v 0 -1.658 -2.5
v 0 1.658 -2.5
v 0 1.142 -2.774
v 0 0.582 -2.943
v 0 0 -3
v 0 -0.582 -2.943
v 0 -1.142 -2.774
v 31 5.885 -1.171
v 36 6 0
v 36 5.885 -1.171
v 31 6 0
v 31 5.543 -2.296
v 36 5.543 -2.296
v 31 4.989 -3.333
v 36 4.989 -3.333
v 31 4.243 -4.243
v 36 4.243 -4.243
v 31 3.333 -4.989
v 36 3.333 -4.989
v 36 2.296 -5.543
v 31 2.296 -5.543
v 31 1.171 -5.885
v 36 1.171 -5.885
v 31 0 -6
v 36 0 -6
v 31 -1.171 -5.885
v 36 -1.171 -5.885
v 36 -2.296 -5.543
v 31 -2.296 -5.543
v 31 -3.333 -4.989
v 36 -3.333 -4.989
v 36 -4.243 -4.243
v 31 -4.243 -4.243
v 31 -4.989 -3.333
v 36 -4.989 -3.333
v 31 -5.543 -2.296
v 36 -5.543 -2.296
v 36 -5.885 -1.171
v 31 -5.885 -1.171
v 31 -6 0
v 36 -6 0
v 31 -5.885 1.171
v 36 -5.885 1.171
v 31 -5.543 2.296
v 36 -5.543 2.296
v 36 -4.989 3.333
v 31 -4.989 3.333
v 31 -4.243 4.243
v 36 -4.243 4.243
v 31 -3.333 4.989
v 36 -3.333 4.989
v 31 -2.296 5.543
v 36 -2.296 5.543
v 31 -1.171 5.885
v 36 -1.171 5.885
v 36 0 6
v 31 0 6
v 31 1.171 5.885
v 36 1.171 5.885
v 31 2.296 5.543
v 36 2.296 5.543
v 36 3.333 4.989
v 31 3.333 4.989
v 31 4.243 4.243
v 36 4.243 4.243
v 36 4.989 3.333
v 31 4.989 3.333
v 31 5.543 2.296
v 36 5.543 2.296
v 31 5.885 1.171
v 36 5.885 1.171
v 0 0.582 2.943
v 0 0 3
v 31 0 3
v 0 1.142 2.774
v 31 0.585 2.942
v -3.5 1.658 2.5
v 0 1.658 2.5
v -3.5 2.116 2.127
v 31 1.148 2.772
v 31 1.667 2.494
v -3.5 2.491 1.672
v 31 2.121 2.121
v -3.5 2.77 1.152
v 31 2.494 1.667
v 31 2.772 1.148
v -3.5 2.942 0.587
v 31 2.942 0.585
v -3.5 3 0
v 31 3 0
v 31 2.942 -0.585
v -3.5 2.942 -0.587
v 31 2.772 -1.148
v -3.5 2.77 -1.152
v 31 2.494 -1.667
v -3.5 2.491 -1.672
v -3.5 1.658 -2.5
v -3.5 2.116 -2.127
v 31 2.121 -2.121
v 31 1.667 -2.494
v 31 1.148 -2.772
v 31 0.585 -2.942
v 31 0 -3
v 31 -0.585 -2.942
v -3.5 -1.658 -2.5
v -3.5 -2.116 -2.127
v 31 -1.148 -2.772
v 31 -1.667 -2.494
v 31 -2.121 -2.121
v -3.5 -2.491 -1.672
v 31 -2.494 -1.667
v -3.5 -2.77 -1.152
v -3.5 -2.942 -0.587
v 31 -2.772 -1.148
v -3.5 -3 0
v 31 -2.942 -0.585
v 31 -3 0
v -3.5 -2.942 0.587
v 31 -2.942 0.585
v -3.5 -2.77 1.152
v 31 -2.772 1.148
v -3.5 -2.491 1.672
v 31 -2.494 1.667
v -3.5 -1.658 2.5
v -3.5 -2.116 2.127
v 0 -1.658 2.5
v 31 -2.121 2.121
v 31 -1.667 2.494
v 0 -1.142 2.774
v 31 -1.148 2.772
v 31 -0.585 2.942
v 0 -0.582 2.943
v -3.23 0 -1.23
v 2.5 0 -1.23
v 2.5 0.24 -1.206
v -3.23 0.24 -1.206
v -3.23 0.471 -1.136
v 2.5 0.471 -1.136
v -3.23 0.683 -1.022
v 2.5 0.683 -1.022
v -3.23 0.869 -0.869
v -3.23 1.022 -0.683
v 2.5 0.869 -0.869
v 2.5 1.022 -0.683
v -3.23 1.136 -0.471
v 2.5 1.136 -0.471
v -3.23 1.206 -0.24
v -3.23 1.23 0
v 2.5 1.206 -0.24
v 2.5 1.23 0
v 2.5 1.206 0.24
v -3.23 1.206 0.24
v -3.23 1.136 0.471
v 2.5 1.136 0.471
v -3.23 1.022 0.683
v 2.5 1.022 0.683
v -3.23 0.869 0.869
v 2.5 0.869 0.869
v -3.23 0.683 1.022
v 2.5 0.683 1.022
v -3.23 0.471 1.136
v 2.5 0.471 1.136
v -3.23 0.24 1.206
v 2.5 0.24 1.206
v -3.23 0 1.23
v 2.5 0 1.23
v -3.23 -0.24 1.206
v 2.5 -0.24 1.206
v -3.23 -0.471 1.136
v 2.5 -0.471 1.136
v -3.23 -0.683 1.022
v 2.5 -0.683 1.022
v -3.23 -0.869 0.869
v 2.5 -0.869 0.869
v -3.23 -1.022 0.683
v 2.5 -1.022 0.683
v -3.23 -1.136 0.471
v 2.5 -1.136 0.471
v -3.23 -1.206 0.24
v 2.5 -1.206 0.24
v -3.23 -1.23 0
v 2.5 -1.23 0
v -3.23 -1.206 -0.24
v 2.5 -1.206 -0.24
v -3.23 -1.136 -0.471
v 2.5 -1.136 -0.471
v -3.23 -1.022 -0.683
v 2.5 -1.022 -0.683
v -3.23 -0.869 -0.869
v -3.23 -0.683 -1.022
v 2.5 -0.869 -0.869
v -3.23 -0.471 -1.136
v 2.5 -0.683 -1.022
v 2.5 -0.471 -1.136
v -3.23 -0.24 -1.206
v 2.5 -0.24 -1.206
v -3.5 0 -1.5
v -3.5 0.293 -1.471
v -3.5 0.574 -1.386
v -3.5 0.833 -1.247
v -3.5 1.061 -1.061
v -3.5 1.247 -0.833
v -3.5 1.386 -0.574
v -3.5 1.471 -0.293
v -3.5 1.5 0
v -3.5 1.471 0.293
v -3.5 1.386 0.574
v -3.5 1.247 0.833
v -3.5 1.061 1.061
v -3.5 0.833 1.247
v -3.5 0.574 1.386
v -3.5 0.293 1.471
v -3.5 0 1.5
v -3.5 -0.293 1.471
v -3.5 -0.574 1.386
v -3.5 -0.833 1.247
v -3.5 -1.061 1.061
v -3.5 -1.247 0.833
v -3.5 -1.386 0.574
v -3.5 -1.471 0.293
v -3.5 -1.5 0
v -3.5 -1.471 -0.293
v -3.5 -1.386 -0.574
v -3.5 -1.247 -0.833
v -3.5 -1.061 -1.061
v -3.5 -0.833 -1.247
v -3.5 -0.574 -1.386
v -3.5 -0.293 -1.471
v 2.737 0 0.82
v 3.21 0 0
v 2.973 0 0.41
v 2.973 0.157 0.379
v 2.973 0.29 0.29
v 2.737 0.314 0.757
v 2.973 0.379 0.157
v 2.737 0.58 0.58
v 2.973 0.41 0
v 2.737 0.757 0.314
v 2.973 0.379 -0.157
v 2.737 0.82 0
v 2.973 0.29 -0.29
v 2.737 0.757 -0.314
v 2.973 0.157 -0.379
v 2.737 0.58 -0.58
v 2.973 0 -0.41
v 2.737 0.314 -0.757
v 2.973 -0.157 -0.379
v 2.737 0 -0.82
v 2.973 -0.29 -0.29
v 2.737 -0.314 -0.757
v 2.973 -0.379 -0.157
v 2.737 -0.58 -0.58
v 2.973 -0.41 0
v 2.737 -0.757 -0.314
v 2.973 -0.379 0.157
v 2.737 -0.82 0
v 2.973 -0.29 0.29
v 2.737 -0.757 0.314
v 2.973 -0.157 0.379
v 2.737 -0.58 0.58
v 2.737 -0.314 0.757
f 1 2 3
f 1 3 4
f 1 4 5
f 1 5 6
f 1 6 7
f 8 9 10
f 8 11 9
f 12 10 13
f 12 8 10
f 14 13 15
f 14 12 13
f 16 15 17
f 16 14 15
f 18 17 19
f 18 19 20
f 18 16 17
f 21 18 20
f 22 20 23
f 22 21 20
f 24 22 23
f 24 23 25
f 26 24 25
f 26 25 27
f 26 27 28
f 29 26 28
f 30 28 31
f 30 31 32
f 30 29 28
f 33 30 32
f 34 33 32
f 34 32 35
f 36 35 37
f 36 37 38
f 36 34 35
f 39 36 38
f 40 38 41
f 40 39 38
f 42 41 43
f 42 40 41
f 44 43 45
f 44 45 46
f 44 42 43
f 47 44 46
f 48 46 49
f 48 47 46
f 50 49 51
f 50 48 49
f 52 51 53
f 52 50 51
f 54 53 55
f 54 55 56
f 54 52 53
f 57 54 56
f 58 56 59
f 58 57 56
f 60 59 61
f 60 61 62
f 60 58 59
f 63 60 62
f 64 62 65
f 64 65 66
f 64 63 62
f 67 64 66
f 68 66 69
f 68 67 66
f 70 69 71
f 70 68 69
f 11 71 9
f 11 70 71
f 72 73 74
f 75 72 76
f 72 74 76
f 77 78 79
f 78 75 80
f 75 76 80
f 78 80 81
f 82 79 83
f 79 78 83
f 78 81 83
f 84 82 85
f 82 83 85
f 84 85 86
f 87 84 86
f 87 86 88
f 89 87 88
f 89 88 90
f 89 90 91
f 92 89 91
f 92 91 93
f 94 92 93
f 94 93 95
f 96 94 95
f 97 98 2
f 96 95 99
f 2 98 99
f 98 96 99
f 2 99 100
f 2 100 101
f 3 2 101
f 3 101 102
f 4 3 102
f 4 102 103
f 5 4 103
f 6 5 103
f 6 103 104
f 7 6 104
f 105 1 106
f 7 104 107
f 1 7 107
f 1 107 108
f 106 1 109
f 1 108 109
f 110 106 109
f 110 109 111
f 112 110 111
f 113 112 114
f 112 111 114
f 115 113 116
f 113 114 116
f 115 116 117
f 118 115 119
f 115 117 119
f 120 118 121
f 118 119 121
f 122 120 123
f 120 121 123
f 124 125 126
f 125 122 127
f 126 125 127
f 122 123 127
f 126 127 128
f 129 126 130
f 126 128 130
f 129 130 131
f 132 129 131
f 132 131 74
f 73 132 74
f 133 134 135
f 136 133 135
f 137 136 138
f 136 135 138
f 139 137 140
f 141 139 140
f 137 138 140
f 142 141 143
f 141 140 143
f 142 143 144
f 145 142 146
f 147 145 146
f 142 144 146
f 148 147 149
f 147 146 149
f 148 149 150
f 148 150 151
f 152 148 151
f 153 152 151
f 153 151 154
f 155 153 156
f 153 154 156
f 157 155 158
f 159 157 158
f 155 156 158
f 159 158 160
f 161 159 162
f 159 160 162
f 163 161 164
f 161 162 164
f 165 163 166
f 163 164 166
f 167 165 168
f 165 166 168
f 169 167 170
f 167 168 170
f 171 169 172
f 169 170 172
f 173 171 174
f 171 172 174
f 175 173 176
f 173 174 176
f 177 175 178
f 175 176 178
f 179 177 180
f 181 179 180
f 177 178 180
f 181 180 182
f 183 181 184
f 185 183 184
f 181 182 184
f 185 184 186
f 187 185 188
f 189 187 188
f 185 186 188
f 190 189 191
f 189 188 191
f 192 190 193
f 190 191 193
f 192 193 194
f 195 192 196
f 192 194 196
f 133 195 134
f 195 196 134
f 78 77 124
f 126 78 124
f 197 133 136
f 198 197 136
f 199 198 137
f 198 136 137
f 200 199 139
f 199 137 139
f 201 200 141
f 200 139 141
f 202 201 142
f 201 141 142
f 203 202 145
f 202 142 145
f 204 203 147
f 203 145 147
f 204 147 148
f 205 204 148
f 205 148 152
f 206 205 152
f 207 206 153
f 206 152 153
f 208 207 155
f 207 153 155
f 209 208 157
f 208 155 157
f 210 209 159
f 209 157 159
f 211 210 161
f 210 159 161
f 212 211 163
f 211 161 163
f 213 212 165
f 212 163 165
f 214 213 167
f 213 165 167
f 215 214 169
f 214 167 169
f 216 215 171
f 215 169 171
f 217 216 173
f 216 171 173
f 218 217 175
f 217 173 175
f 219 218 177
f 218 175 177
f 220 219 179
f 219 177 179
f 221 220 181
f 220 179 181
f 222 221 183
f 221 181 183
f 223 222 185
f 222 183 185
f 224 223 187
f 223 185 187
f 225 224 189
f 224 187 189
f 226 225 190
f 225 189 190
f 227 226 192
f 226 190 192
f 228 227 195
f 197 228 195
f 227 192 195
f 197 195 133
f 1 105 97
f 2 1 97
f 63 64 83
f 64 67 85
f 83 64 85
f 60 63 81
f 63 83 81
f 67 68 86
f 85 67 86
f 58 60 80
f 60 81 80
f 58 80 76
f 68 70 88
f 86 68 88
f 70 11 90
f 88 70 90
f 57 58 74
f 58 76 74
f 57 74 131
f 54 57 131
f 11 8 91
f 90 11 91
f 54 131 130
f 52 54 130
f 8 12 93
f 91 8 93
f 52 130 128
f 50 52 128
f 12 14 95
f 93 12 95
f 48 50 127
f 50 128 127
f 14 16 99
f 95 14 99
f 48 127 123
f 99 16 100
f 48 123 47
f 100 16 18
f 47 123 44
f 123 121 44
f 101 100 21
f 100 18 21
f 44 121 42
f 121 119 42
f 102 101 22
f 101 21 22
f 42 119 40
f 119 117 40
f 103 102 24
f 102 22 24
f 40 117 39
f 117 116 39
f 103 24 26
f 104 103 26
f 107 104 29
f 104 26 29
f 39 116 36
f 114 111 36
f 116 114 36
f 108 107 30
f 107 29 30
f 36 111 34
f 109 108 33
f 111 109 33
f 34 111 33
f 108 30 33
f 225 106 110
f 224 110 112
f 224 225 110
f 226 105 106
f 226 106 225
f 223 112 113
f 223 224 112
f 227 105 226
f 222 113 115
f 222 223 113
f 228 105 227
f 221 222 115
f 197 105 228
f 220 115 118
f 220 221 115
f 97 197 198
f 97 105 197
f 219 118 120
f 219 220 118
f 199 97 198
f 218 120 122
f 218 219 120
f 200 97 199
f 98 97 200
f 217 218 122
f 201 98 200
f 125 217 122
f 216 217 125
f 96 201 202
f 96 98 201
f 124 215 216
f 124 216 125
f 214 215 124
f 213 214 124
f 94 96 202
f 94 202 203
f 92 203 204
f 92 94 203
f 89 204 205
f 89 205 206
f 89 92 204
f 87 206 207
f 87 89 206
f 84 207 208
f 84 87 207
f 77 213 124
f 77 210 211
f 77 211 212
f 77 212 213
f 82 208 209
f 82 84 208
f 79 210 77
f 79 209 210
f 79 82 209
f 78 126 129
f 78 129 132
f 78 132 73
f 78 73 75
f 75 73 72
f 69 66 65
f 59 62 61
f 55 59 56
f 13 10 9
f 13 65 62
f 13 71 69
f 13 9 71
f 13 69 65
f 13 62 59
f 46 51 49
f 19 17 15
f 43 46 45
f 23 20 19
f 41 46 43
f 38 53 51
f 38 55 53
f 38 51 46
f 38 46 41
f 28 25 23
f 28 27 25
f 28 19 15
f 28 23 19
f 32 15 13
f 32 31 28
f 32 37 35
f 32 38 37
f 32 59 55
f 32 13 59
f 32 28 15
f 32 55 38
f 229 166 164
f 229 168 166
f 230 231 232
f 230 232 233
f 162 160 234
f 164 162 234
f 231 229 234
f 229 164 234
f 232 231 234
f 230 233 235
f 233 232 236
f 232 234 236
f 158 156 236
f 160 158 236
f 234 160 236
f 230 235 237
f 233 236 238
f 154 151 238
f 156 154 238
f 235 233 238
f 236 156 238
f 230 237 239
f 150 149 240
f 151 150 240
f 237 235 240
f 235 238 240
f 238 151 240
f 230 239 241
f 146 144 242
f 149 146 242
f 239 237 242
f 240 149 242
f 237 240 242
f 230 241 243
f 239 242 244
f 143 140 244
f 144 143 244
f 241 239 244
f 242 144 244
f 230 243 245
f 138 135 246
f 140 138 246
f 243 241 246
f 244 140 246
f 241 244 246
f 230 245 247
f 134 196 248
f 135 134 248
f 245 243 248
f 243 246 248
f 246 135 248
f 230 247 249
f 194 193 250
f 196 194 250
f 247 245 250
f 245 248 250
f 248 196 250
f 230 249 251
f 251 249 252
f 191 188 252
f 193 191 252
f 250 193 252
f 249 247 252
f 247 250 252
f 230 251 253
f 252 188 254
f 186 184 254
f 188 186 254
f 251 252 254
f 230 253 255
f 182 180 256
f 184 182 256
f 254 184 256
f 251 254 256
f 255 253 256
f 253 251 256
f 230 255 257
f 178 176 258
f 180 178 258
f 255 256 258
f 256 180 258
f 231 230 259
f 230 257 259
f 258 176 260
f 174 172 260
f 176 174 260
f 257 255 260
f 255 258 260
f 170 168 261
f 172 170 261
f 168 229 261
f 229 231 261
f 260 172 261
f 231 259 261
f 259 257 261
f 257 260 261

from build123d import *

# Parameters (mm, degrees)
SKETCH1_W                = 5
SKETCH1_H                = 6
SKETCH2_R                = 3
BOSS_EXTRUDE1_DEPTH      = 34.5
CUT_EXTRUDE1_DEPTH       = 3.5
CUT_EXTRUDE2_DEPTH       = 3.5
M2_CLEARANCE_HOLE1_D     = 2.459
M2_CLEARANCE_HOLE1_DEPTH = 6
M2_CLEARANCE_HOLE1_TIP   = 0.709852156
CHAMFER1_SIZE            = 0.2705


with BuildPart() as part:
    # Sketch1 → Revolve1 (revolve)
    with BuildSketch(Plane(origin=(0, 0, 0), x_dir=(-1, 0, 0), z_dir=(0, 0, -1))):
        with Locations((-33.5, 3)):
            Rectangle(SKETCH1_W, SKETCH1_H)
    revolve(axis=Axis((36, 0, 0), (-1, 0, 0)))

    # Sketch2 → Boss-Extrude1 (add)
    with BuildSketch(Plane.ZY.offset(-31)):
        Circle(SKETCH2_R)
    extrude(amount=BOSS_EXTRUDE1_DEPTH)

    # Sketch3 → Cut-Extrude1 (cut)
    with BuildSketch(Plane.ZY.offset(3.5)):
        with BuildLine():
            Line((-2.5, -1.658312395), (-2.5, 1.658312395))
            ThreePointArc((-2.5, 1.658312395), (-3, 0), (-2.5, -1.658312395))
        make_face()
    extrude(amount=-CUT_EXTRUDE1_DEPTH, mode=Mode.SUBTRACT)

    # Sketch4 → Cut-Extrude2 (cut)
    with BuildSketch(Plane.ZY.offset(3.5)):
        with BuildLine():
            Line((2.5, 1.658312395), (2.5, -1.658312395))
            ThreePointArc((2.5, -1.658312395), (3, 0), (2.5, 1.658312395))
        make_face()
    extrude(amount=-CUT_EXTRUDE2_DEPTH, mode=Mode.SUBTRACT)

    # M2 Clearance Hole1
    with Locations(Plane.ZY.offset(3.5)):
        with Locations((0, 0)):
            Hole(M2_CLEARANCE_HOLE1_D / 2, depth=M2_CLEARANCE_HOLE1_DEPTH)
            with Locations((0, 0, -(M2_CLEARANCE_HOLE1_DEPTH + M2_CLEARANCE_HOLE1_TIP / 2))):  # 120° drill point
                Cone(0, M2_CLEARANCE_HOLE1_D / 2, M2_CLEARANCE_HOLE1_TIP, mode=Mode.SUBTRACT)

    # Chamfer1
    chamfer1_edges = [part.edges().sort_by_distance(p)[0] for p in [
        (-3.5, 0, 1.2295),
    ]]
    chamfer(chamfer1_edges, length=CHAMFER1_SIZE)


solid = part.part
